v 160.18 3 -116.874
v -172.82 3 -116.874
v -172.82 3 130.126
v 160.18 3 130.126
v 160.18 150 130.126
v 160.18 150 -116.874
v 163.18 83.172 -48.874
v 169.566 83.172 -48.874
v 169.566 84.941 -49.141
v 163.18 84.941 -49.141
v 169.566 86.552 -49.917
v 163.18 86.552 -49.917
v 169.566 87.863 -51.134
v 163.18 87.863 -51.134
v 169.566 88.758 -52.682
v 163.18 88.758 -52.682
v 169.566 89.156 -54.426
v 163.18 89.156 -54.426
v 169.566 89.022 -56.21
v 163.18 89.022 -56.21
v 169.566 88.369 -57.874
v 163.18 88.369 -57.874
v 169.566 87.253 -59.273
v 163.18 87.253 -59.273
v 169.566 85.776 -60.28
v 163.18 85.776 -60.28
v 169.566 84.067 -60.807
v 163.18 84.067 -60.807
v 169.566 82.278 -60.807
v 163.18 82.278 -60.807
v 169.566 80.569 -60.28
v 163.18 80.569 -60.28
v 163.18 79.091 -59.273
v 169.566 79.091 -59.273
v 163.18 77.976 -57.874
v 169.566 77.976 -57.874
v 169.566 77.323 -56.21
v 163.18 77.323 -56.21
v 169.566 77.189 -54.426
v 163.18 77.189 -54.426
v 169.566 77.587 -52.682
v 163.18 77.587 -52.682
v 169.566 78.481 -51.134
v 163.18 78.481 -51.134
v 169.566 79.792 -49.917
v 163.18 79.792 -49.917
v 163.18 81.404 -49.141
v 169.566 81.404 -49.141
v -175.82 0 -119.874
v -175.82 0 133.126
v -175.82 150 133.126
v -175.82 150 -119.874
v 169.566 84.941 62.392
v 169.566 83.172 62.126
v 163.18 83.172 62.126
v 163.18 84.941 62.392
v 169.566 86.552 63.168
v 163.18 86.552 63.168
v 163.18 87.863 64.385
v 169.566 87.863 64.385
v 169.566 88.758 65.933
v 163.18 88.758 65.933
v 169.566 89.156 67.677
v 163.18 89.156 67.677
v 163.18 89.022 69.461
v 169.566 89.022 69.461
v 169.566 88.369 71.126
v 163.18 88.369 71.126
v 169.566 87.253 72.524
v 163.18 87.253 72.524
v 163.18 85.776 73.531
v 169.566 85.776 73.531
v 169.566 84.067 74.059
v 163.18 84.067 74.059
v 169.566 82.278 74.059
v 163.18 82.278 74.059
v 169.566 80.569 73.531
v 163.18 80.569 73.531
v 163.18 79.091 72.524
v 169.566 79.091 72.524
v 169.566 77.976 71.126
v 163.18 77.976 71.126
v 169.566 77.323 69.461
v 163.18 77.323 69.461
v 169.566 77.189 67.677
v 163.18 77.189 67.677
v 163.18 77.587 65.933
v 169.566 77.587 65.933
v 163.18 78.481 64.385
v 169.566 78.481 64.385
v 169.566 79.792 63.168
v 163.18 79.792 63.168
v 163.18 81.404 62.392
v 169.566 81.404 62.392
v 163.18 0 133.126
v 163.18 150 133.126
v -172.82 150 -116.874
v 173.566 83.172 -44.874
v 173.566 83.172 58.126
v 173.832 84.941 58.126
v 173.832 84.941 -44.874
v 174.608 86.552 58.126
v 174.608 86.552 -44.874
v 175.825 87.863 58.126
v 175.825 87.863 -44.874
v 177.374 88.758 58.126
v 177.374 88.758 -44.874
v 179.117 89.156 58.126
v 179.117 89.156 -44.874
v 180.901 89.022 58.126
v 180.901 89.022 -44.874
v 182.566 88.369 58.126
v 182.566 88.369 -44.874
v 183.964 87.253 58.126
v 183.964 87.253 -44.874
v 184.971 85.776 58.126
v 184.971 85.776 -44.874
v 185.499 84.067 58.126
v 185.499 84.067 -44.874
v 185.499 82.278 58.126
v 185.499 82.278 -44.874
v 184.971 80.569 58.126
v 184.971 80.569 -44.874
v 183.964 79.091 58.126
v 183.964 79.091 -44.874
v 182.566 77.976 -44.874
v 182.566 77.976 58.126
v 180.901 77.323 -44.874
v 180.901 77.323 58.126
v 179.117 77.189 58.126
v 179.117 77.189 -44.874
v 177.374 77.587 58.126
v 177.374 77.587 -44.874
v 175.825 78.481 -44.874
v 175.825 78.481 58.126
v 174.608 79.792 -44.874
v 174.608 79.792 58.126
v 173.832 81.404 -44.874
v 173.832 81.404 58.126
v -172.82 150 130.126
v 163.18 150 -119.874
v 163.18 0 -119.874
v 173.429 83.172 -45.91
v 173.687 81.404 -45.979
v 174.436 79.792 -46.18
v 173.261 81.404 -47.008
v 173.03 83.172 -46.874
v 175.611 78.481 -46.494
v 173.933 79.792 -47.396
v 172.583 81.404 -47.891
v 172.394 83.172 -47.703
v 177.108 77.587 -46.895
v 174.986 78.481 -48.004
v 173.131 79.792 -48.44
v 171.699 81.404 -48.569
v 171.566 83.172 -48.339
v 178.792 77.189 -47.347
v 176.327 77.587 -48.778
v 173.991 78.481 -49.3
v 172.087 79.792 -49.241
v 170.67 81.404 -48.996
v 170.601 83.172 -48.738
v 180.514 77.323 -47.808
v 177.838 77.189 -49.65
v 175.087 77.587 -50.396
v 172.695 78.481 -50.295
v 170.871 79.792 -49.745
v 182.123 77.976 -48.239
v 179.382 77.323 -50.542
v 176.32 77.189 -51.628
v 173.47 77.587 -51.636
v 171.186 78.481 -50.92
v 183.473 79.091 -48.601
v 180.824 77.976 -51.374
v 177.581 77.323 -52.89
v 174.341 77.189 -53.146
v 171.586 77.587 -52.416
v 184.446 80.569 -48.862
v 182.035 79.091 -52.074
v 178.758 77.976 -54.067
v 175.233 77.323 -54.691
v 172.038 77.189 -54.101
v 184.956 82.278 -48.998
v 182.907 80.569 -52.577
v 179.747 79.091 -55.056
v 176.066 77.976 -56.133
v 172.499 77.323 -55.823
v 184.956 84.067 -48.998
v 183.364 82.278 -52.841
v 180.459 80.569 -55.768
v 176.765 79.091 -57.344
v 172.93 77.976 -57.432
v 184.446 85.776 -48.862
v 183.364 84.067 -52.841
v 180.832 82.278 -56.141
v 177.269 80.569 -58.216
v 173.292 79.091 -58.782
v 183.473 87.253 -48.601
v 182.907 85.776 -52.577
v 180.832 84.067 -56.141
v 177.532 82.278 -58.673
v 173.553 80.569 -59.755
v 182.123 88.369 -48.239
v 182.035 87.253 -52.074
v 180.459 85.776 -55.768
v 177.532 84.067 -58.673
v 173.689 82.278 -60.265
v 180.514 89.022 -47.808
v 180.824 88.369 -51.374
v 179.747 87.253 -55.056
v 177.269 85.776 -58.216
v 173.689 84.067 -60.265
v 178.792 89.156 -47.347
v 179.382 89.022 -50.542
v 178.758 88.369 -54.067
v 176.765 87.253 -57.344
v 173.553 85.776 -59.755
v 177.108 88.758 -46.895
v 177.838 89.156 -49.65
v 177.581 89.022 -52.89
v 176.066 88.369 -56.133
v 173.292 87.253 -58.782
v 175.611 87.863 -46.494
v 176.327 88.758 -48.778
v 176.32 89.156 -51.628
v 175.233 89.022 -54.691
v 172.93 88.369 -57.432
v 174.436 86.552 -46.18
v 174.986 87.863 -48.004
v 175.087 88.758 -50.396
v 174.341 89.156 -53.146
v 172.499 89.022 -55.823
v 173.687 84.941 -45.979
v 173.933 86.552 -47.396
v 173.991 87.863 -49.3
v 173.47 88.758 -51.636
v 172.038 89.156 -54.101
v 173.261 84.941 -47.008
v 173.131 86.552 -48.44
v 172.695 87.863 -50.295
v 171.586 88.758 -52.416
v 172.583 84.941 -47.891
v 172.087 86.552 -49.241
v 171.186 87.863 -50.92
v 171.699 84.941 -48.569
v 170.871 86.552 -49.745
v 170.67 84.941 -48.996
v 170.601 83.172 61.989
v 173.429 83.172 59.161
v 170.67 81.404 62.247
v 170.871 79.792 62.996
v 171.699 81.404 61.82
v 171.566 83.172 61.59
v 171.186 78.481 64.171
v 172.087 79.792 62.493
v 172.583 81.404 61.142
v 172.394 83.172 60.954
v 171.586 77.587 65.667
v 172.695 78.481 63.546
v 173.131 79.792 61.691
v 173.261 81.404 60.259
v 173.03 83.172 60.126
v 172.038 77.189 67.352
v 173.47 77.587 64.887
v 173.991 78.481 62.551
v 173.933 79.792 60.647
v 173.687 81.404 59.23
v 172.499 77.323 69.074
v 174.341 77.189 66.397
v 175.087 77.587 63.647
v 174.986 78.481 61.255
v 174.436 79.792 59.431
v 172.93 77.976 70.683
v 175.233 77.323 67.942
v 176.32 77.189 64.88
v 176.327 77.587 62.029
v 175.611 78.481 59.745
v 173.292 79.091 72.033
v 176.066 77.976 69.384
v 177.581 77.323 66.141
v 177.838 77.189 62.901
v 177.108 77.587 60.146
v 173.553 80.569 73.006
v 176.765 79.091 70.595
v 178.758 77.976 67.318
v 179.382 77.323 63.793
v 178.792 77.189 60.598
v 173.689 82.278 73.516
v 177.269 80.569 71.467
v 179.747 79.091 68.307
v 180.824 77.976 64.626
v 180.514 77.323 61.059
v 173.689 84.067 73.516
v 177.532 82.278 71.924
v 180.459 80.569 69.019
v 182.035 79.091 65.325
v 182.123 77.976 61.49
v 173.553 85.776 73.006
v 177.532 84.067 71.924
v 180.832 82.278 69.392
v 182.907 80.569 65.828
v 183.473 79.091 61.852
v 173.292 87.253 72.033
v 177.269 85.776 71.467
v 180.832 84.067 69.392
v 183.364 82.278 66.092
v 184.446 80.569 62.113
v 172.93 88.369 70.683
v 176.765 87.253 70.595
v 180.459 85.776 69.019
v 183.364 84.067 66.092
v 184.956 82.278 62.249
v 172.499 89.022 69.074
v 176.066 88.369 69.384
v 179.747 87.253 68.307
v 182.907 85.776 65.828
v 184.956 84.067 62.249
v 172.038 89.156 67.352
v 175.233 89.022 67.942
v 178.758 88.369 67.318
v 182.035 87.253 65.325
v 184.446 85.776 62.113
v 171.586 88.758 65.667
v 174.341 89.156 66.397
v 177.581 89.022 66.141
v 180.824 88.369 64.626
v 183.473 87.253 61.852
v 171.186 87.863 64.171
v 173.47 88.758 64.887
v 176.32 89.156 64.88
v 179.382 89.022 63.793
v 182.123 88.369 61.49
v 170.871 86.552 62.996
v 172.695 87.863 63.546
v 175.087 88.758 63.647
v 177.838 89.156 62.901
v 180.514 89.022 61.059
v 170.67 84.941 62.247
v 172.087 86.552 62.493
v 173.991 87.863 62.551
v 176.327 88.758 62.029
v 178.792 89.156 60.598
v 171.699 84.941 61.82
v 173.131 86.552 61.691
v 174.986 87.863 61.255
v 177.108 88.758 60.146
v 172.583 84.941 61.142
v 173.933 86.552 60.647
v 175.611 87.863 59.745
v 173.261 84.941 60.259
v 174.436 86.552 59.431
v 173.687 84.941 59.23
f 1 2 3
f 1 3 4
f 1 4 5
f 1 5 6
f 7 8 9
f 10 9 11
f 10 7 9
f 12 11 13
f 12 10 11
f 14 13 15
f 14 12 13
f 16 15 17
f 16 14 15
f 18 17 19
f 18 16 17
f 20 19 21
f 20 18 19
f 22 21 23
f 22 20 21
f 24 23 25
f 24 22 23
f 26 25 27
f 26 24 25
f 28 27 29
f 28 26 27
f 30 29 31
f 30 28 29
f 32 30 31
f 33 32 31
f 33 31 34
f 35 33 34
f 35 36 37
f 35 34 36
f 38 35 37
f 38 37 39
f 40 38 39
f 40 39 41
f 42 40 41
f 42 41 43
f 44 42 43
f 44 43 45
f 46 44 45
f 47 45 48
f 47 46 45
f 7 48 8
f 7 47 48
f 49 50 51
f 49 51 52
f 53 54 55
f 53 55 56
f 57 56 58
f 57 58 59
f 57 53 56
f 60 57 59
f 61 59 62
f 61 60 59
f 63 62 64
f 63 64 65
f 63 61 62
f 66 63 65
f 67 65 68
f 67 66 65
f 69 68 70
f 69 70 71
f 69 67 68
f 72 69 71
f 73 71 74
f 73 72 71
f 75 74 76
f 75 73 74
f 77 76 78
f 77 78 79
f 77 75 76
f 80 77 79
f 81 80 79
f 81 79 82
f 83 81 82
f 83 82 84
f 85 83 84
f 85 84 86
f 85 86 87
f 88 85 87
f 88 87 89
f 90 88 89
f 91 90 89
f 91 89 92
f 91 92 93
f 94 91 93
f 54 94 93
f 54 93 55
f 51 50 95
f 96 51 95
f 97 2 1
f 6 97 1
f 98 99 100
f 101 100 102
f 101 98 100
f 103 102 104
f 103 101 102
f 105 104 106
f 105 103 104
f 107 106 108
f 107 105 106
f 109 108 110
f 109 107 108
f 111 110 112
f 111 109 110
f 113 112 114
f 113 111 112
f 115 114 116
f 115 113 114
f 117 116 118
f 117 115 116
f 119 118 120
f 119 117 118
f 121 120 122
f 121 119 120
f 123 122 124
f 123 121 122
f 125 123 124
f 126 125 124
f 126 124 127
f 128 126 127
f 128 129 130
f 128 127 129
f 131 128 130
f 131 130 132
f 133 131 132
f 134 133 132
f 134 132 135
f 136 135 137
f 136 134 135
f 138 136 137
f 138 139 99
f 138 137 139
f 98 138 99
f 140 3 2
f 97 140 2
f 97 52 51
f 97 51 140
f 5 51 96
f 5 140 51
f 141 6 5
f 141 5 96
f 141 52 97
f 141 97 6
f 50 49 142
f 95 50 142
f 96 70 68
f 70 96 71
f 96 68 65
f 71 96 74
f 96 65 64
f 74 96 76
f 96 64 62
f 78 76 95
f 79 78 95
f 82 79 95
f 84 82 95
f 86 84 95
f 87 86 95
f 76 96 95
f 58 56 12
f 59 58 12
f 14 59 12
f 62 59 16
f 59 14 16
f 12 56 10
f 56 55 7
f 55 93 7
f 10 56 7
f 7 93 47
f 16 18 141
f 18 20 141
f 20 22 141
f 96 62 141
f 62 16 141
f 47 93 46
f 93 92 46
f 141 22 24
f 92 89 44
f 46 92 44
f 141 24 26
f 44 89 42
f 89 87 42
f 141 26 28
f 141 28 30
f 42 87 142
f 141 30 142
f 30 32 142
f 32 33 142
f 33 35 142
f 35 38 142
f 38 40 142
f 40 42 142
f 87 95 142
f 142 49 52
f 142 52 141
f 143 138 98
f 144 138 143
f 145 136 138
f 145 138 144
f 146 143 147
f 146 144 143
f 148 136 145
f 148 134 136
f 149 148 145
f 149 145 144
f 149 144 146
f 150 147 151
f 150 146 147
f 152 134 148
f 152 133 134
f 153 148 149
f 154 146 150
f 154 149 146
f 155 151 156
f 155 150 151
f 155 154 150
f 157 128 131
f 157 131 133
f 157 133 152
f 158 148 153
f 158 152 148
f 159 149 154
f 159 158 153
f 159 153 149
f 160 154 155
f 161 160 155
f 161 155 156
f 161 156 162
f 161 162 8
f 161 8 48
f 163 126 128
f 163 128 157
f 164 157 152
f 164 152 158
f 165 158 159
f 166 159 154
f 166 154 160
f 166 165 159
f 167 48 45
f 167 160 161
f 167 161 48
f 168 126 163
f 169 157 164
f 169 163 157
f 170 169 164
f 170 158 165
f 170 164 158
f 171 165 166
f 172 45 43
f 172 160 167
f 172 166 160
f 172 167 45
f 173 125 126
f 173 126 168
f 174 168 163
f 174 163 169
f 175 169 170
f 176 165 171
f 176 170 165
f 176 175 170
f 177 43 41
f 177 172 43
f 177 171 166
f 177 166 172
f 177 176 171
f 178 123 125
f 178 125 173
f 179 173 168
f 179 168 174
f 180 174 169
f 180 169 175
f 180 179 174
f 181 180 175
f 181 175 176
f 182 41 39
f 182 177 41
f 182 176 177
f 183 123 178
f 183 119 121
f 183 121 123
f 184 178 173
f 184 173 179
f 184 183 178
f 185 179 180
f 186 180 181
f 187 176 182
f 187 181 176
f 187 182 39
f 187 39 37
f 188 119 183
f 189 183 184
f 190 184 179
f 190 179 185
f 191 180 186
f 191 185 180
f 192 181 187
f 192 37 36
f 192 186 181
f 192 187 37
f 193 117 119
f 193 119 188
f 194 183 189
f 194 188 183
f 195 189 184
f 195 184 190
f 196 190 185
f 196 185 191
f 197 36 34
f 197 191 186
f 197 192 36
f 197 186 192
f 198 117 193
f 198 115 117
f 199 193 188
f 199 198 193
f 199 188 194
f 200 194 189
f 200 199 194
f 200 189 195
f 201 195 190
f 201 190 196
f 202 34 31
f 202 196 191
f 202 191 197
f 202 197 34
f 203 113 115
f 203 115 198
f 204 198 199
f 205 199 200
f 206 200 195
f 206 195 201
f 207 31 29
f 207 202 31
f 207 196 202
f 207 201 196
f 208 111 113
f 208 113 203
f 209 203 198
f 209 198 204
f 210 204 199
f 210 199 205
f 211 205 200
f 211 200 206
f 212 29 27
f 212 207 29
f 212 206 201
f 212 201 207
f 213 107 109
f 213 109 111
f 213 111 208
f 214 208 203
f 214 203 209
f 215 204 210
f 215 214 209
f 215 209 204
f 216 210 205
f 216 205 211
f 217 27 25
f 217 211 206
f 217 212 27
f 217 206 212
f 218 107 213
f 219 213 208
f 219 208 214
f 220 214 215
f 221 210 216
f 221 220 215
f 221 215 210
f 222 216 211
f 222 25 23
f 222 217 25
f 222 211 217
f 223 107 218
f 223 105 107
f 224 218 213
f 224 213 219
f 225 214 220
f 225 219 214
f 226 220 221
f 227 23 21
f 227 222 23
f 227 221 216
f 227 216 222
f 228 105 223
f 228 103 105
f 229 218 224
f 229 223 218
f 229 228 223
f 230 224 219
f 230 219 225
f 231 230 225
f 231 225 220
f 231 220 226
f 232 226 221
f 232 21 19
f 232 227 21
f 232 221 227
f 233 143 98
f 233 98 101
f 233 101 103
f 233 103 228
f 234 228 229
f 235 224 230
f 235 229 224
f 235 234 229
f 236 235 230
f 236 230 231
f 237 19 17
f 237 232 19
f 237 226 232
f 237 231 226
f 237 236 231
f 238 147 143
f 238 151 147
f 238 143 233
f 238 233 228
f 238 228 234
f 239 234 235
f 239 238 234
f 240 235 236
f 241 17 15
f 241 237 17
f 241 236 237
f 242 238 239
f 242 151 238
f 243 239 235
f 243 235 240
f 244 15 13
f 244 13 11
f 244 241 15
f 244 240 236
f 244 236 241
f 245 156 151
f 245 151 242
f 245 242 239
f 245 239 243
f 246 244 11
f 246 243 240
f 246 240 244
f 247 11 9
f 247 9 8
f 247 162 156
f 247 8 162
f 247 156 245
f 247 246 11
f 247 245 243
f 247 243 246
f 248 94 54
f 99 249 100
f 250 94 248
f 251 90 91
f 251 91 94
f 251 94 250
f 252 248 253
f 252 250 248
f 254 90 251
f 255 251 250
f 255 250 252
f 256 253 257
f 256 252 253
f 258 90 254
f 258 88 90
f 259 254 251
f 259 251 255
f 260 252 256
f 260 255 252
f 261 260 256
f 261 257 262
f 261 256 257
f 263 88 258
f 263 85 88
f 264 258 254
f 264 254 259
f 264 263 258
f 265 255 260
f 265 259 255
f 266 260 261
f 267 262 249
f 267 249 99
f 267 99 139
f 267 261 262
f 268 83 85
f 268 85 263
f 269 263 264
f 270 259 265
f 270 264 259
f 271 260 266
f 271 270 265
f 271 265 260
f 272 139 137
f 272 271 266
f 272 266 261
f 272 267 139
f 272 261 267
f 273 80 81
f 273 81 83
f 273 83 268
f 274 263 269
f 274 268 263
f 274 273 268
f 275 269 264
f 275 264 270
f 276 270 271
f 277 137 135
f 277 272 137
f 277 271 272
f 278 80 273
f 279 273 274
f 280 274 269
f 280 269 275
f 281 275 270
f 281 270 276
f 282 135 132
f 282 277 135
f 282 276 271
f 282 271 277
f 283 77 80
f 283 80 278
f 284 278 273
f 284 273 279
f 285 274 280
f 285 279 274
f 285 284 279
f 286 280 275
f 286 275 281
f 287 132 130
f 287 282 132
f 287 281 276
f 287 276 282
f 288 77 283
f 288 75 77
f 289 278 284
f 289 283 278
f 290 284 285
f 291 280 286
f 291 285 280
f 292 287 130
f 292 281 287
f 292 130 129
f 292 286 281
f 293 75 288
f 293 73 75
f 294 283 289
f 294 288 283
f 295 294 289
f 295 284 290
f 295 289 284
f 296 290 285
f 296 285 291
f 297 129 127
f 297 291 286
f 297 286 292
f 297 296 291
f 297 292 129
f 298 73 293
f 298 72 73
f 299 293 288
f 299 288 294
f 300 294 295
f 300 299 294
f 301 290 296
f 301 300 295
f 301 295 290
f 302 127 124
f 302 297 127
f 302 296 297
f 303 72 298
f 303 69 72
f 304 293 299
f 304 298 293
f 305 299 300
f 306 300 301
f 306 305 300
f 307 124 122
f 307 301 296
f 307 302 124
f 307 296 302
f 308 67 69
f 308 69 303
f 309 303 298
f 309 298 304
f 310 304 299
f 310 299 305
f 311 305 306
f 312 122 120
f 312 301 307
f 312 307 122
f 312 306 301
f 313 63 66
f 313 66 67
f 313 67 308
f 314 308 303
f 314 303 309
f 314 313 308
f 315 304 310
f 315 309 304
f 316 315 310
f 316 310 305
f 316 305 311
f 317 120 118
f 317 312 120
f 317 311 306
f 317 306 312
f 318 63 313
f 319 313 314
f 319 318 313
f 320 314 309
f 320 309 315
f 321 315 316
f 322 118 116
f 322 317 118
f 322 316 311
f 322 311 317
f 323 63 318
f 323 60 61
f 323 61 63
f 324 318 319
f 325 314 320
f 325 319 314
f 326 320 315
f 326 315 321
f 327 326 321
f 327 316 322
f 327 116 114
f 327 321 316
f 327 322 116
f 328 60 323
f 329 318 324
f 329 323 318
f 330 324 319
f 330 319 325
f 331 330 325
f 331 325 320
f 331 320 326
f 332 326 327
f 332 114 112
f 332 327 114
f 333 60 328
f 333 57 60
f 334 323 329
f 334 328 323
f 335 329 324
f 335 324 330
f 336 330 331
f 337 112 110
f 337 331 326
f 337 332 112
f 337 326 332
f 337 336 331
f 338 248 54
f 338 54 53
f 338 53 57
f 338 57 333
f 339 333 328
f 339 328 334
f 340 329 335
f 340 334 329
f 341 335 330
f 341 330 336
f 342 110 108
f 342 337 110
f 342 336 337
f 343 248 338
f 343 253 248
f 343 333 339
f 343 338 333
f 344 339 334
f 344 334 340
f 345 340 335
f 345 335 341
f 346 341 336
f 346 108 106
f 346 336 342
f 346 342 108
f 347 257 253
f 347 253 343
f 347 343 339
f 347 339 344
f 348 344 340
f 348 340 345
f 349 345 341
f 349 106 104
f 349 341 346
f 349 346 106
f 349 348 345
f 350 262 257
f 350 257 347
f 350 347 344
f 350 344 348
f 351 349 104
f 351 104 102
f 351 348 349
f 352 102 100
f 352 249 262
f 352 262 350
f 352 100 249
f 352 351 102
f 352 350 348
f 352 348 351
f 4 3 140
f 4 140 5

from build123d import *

# Parameters (mm, degrees)
SKETCH1_W           = 339
SKETCH1_H           = 253
BOSS_EXTRUDE1_DEPTH = 150
SHELL1_T            = -3
SKETCH2_R           = 6


with BuildPart() as part:
    # Sketch1 → Boss-Extrude1 (new body)
    with BuildSketch(Plane(origin=(0, 0, 0), x_dir=(1, 0, 0), z_dir=(0, 1, 0))):
        with Locations((-6.320083682, -6.625523013)):
            Rectangle(SKETCH1_W, SKETCH1_H)
    extrude(amount=BOSS_EXTRUDE1_DEPTH)

    # Shell1
    shell1_openings = [part.faces().sort_by_distance(p)[0] for p in [
        (-6.320083682, 150, 6.625523013),
    ]]
    offset(amount=SHELL1_T, openings=shell1_openings, kind=Kind.INTERSECTION)

    # Sweep2: sweep along a path in Sketch4
    with BuildLine(Plane(origin=(0, 83.172395684, 0), x_dir=(1, 0, 0), z_dir=(0, 1, 0))) as sweep2_path:
        Line((163.179916318, -68.125523013), (169.565605174, -68.125523013))
        ThreePointArc((169.565605174, -68.125523013), (176.636672985, -65.196590824), (179.565605174, -58.125523013))
        Line((179.565605174, -58.125523013), (179.565605174, 44.874476987))
        ThreePointArc((179.565605174, 44.874476987), (176.636672985, 51.945544799), (169.565605174, 54.874476987))
        Line((169.565605174, 54.874476987), (163.179916318, 54.874476987))
    # Sketch2 → Sweep2 (sweep)
    with BuildSketch(Plane(origin=(163.179916318, 0, 0), x_dir=(0, 0, -1), z_dir=(1, 0, 0))):
        with Locations((-68.125523013, 83.172395684)):
            Circle(SKETCH2_R)
    sweep(path=sweep2_path.line)


solid = part.part
